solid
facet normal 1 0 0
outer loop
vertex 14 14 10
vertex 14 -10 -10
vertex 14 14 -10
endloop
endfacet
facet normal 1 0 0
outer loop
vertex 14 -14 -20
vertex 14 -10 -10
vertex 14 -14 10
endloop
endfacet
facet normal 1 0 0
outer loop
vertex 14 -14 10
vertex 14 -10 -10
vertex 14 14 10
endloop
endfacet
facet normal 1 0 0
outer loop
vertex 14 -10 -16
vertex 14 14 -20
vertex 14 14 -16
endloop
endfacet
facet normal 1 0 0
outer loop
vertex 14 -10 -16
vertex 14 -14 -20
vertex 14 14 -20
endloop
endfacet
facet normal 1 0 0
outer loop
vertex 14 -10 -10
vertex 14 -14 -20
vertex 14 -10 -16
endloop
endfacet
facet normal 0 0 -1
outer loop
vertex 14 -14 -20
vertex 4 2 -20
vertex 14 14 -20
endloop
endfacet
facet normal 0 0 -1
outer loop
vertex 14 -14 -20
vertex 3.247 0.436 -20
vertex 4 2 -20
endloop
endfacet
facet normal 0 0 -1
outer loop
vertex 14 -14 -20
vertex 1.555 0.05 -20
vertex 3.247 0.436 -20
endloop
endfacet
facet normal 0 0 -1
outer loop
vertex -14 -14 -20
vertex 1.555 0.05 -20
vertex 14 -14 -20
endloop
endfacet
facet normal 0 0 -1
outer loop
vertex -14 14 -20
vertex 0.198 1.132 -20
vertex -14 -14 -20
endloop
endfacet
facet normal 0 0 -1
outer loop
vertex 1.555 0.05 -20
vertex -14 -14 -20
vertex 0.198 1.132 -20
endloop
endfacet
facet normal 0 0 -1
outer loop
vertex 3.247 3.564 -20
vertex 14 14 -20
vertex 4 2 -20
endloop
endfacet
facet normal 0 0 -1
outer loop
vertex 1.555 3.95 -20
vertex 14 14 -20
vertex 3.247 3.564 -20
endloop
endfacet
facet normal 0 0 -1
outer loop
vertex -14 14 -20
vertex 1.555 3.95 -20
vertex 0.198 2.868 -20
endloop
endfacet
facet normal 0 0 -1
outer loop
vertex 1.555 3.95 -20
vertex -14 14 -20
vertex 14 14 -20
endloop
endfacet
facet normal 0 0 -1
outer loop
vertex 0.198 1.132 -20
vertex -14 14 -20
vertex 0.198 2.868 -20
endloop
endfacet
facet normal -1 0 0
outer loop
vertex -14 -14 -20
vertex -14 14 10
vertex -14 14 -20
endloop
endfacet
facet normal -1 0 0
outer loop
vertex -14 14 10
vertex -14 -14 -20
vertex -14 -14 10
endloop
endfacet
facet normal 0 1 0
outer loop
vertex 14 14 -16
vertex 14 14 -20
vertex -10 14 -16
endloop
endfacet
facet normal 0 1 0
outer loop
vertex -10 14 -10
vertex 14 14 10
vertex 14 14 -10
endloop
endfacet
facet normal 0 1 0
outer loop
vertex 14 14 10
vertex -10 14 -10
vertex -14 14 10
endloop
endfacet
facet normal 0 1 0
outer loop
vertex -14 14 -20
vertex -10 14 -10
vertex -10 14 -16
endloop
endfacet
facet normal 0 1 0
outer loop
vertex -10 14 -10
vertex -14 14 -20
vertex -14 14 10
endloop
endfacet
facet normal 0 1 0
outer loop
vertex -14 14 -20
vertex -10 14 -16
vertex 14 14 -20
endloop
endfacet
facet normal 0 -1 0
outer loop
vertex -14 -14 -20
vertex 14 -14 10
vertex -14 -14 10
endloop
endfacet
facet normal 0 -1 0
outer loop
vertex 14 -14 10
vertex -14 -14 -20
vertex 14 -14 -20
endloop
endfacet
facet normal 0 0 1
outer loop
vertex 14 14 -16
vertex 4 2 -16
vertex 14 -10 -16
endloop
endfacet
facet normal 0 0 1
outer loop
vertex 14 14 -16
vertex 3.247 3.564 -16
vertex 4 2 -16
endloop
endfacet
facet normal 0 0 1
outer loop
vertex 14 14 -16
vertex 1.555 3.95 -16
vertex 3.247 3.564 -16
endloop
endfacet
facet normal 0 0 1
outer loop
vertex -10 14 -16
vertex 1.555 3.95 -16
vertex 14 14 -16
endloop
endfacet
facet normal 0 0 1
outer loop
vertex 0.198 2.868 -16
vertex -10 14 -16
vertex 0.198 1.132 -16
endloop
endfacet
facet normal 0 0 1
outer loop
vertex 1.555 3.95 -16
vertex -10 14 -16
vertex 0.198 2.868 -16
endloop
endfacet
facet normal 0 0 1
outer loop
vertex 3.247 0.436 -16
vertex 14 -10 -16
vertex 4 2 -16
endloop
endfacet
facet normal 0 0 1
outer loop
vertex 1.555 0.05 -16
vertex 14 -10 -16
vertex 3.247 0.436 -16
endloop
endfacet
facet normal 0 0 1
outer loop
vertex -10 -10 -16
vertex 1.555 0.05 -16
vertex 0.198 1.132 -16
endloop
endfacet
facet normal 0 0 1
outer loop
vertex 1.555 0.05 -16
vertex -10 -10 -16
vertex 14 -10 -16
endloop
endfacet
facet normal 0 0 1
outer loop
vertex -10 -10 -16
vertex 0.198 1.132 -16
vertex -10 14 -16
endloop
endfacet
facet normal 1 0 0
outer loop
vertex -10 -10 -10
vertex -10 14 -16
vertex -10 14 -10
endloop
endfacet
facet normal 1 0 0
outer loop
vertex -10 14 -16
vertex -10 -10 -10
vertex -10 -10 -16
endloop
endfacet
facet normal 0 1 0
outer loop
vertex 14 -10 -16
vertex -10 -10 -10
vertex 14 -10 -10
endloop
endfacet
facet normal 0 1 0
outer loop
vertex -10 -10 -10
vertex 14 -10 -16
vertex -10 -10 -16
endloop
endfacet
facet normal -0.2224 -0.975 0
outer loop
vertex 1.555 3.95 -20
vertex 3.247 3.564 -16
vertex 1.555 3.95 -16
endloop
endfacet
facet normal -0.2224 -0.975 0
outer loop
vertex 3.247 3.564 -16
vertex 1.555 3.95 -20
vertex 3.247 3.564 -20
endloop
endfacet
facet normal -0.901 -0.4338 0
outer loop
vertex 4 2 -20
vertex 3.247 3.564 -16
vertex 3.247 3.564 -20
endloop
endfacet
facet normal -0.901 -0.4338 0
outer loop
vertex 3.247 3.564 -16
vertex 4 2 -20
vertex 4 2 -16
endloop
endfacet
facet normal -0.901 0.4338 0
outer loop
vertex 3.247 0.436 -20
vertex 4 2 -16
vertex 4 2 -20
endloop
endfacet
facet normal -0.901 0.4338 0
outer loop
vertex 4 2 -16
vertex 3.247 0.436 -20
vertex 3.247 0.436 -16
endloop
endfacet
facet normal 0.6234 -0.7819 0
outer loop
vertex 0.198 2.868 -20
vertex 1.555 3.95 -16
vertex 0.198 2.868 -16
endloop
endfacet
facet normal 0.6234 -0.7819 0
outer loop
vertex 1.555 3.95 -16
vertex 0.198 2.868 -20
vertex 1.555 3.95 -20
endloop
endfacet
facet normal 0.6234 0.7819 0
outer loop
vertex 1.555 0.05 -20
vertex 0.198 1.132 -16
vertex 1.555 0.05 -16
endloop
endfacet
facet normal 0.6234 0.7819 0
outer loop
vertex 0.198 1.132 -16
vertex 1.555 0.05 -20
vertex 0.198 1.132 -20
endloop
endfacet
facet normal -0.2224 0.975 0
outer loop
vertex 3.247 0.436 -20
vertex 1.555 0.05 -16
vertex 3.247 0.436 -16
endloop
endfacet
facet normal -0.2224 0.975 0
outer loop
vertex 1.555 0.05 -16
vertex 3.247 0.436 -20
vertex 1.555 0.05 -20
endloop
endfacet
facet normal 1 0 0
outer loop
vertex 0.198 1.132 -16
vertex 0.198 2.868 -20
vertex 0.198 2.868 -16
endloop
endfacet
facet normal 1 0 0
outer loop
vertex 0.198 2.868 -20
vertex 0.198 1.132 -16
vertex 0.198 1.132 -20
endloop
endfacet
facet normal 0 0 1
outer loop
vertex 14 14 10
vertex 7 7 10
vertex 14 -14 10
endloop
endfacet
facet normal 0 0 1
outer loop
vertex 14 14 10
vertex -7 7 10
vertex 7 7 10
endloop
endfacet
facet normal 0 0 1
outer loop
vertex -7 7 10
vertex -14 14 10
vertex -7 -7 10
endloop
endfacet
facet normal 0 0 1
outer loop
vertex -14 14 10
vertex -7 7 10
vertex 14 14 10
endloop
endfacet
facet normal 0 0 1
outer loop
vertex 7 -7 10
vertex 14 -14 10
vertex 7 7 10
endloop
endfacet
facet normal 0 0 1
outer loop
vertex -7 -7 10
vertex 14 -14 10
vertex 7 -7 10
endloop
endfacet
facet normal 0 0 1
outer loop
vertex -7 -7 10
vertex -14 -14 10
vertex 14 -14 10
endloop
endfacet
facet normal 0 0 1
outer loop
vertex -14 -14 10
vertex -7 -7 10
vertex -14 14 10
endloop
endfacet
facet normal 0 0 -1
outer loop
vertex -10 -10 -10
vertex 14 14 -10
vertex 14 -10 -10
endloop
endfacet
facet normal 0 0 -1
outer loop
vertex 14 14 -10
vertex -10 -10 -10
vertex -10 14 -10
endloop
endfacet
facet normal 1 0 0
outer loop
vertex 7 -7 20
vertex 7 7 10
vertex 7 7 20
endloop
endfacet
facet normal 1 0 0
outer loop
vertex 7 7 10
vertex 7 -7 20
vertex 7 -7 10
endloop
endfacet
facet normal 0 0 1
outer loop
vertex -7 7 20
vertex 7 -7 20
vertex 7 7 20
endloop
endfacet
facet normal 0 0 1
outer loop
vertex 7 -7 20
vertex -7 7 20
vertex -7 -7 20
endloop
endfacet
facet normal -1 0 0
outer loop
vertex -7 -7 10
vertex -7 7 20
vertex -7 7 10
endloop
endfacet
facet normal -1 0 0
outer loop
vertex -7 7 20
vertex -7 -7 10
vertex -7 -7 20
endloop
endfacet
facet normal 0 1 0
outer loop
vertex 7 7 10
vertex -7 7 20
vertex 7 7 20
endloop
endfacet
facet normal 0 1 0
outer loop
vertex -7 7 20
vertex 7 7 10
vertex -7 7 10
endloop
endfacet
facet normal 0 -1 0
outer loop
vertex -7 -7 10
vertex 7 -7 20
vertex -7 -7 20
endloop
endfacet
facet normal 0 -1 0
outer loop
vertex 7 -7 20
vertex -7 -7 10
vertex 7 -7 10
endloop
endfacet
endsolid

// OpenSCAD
// Parameters
total_length = 28; //[14:56:1]
envelope_x = 28; //[14:56:1]
envelope_y = 28; //[14:56:1]
envelope_z = 20; //[10:40:1]
leg_thickness = 4; //[2:8:1]
base_plate_thickness = 4; //[2:8:1]
internal_corner_radius = 2; //[1:4:0.5]
external_edge_chamfer = 0.5; //[0:2:0.5]
grub_screw_count = 2; //[1:4:1]
grub_screw_hole_diameter = 3.3; //[2.5:5:0.1]
grub_screw_hole_depth = 8; //[4:16:1]
grub_screw_axis_offset_from_edges = 10; //[5:20:1]
grub_screw_boss_diameter = 10; //[6:16:0.5]
grub_screw_boss_height = 2; //[1:6:0.5]
overlap = 1; //[0.5:2:0.5]

// Extrusion - complete geometry
module extrusion() {
  color("Silver") {
    cube([envelope_x, envelope_y, envelope_z], center=true);
  }
}

// Corner - complete geometry
module corner() {
  color("DimGray") {
    cube([envelope_x/2, envelope_y/2, envelope_z], center=true);
  }
}

// Extrusion Corner Bracket - complete geometry
module extrusion_corner_bracket() {
  color("Silver") {
    difference() {
      cube([envelope_x, envelope_y, envelope_z], center=true);
      translate([leg_thickness/2, leg_thickness/2, base_plate_thickness/2])
        cube([envelope_x - leg_thickness, envelope_y - leg_thickness, envelope_z - base_plate_thickness], center=true);
      translate([leg_thickness/2, leg_thickness/2, 0])
        cylinder(r=internal_corner_radius, h=envelope_z + 2*overlap, center=true);
    }
  }
}

// Extrusion Corner Bracket 3D - complete geometry
module extrusion_corner_bracket_3D() {
  color("Silver") {
    union() {
      translate([envelope_x/2 - grub_screw_boss_height/2 + overlap, envelope_y/2 - grub_screw_axis_offset_from_edges, base_plate_thickness + (envelope_z - base_plate_thickness)/2])
        rotate([0, 90, 0])
        cylinder(r=grub_screw_boss_diameter/2, h=grub_screw_boss_height, center=true);
      translate([envelope_x/2 - grub_screw_axis_offset_from_edges, envelope_y/2 - grub_screw_boss_height/2 + overlap, base_plate_thickness + (envelope_z - base_plate_thickness)/2])
        rotate([90, 0, 0])
        cylinder(r=grub_screw_boss_diameter/2, h=grub_screw_boss_height, center=true);
    }
  }
}

// Extrusion Inner Corner Bracket - complete geometry
module extrusion_inner_corner_bracket() {
  color("Silver") {
    difference() {
      extrusion_corner_bracket();
      union() {
        translate([envelope_x/2 - grub_screw_hole_depth/2 + overlap, envelope_y/2 - grub_screw_axis_offset_from_edges, base_plate_thickness + (envelope_z - base_plate_thickness)/2])
          rotate([0, 90, 0])
          cylinder(r=grub_screw_hole_diameter/2, h=grub_screw_hole_depth + 2*overlap, center=true);
        translate([envelope_x/2 - grub_screw_axis_offset_from_edges, envelope_y/2 - grub_screw_hole_depth/2 + overlap, base_plate_thickness + (envelope_z - base_plate_thickness)/2])
          rotate([90, 0, 0])
          cylinder(r=grub_screw_hole_diameter/2, h=grub_screw_hole_depth + 2*overlap, center=true);
      }
    }
  }
}

// Assembly
module assembly() {
  translate([0, 0, 0]) extrusion();
  translate([0, 0, envelope_z/2]) corner();
  translate([0, 0, -envelope_z/2]) extrusion_inner_corner_bracket();
}

assembly();
